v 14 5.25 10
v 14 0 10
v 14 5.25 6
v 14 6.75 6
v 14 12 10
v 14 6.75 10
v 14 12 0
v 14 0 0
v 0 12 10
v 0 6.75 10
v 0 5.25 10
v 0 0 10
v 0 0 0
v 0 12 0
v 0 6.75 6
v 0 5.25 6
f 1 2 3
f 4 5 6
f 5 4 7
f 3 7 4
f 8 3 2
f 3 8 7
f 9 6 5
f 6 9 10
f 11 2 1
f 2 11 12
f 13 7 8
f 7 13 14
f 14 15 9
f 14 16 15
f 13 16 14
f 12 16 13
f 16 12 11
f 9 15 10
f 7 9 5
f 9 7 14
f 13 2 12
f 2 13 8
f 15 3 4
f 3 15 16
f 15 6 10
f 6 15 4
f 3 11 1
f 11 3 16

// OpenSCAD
$fn = 32;

// ----------------------------------------------------------------------
// Micro clip: slotted block, 5-20 mm class
// ----------------------------------------------------------------------

// --- parameters (mm) ---
block_l = 14;             // block length, X
block_w = 12;             // block width, Y
block_h = 10;             // block height, Z
slot_w = 1.5;             // slot width
slot_d = 4;               // slot depth from the top

difference() {
  cube([block_l, block_w, block_h]);
  translate([-1, block_w / 2 - slot_w / 2, block_h - slot_d])
    cube([block_l + 2, slot_w, slot_d + 1]);
}
